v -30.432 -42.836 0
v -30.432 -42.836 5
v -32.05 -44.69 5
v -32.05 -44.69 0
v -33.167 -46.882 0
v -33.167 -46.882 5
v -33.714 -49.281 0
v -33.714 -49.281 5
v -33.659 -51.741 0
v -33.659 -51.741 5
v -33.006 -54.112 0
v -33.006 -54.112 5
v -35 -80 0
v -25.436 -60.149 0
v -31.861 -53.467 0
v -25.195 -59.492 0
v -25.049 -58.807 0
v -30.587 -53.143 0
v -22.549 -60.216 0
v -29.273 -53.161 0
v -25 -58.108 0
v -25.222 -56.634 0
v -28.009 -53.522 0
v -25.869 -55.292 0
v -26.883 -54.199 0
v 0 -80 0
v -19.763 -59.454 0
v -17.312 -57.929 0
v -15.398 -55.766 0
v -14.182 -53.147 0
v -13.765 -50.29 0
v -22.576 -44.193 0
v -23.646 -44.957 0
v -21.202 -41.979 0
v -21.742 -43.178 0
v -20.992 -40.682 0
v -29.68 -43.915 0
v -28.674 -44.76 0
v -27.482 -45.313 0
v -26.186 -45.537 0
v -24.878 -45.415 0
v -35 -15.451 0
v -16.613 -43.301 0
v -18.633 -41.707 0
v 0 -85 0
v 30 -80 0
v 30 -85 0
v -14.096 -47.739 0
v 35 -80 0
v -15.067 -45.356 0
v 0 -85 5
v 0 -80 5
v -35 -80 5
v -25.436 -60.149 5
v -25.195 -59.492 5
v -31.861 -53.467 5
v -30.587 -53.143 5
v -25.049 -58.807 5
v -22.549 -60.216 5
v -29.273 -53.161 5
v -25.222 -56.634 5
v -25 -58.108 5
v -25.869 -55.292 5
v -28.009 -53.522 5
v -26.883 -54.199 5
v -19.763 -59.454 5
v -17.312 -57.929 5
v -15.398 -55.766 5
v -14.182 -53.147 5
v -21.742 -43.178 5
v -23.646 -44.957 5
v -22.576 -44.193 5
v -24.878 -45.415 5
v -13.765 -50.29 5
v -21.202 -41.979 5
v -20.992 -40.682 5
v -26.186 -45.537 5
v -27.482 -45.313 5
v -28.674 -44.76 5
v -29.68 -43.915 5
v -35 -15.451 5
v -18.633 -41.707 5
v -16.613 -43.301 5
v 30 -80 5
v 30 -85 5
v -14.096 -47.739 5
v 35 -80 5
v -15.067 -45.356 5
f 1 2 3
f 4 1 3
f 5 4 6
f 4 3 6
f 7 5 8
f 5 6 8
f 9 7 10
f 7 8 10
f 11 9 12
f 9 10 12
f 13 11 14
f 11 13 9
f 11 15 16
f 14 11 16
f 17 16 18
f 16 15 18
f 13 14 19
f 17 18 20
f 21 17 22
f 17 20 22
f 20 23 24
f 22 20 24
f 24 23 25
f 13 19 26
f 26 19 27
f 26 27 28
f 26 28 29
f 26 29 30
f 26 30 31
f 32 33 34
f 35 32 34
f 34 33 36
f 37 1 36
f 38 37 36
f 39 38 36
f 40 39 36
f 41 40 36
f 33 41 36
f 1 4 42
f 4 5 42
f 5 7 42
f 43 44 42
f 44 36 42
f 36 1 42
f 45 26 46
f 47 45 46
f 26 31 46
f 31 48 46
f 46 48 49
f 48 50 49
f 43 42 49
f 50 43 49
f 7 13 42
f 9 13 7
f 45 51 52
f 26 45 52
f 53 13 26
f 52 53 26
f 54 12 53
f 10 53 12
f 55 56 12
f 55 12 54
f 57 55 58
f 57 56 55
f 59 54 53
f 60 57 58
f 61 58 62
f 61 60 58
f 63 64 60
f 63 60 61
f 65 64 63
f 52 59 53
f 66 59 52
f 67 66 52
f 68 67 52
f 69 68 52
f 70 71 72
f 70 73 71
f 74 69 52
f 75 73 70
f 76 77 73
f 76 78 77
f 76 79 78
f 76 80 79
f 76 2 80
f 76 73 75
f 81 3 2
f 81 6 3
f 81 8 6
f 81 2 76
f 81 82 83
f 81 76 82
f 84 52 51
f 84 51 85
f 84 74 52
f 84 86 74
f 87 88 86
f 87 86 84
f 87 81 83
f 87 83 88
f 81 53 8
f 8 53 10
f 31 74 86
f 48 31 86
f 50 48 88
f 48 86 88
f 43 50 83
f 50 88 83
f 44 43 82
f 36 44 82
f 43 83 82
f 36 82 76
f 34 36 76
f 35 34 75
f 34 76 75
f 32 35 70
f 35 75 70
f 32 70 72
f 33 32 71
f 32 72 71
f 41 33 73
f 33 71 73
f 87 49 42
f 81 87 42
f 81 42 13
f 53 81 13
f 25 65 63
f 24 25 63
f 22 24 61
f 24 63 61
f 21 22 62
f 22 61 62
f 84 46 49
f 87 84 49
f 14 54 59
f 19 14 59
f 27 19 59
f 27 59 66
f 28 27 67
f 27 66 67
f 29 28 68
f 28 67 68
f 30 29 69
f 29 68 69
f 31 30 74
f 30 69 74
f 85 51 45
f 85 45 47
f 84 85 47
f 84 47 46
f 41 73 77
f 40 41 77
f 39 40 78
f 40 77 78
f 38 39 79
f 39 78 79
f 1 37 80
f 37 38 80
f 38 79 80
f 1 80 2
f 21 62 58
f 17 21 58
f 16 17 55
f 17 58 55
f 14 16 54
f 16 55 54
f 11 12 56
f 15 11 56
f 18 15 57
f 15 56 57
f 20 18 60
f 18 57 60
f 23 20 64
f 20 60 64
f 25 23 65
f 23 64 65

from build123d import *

# Parameters (mm, degrees)
F1_DEPTH = 5
F2_W     = 30
F2_H     = 5
F3_DEPTH = 5
F5_DEPTH = 5.001


with BuildPart() as f1:
    # F0 (on Top) → F1 (new body)
    with BuildSketch(Plane.XY):
        Polygon((-35, -80), (35, -80), (-35, -15.451086), align=None)
    extrude(amount=F1_DEPTH)

    # F2 (on face) → F3 (join)
    with BuildSketch(Plane.XY.offset(5)):
        with Locations((15, -82.5)):
            Rectangle(F2_W, F2_H)
    extrude(amount=-F3_DEPTH)

    # F4 (on face) → F5 (cut, through all)
    with BuildSketch(Plane.XY.offset(5)):
        with BuildLine():
            Line((-24.877707, -45.415195), (-23.765102, -50.289835))
            Line((-23.765102, -50.289835), (-26.882551, -54.198992))
            ThreePointArc((-26.882551, -54.198992), (-25.495156, -55.938731), (-25, -58.10815))
            ThreePointArc((-25, -58.10815), (-25.110116, -59.151716), (-25.435612, -60.149317))
            ThreePointArc((-25.435612, -60.149317), (-17.311619, -57.928719), (-13.765102, -50.289835))
            ThreePointArc((-13.765102, -50.289835), (-15.773609, -44.278509), (-20.992311, -40.681941))
            ThreePointArc((-20.992311, -40.681941), (-22.125625, -43.712968), (-24.877707, -45.415195))
        make_face()
        with BuildLine():
            Line((-26.882551, -54.198992), (-23.765102, -50.289835))
            Line((-23.765102, -50.289835), (-24.877707, -45.415195))
            ThreePointArc((-24.877707, -45.415195), (-28.095815, -45.075625), (-30.43201, -42.836491))
            ThreePointArc((-30.43201, -42.836491), (-33.514381, -48.064626), (-33.005663, -54.112403))
            ThreePointArc((-33.005663, -54.112403), (-29.9293, -53.10865), (-26.882551, -54.198992))
        make_face()
    extrude(amount=-F5_DEPTH, mode=Mode.SUBTRACT)


solid = f1.part
